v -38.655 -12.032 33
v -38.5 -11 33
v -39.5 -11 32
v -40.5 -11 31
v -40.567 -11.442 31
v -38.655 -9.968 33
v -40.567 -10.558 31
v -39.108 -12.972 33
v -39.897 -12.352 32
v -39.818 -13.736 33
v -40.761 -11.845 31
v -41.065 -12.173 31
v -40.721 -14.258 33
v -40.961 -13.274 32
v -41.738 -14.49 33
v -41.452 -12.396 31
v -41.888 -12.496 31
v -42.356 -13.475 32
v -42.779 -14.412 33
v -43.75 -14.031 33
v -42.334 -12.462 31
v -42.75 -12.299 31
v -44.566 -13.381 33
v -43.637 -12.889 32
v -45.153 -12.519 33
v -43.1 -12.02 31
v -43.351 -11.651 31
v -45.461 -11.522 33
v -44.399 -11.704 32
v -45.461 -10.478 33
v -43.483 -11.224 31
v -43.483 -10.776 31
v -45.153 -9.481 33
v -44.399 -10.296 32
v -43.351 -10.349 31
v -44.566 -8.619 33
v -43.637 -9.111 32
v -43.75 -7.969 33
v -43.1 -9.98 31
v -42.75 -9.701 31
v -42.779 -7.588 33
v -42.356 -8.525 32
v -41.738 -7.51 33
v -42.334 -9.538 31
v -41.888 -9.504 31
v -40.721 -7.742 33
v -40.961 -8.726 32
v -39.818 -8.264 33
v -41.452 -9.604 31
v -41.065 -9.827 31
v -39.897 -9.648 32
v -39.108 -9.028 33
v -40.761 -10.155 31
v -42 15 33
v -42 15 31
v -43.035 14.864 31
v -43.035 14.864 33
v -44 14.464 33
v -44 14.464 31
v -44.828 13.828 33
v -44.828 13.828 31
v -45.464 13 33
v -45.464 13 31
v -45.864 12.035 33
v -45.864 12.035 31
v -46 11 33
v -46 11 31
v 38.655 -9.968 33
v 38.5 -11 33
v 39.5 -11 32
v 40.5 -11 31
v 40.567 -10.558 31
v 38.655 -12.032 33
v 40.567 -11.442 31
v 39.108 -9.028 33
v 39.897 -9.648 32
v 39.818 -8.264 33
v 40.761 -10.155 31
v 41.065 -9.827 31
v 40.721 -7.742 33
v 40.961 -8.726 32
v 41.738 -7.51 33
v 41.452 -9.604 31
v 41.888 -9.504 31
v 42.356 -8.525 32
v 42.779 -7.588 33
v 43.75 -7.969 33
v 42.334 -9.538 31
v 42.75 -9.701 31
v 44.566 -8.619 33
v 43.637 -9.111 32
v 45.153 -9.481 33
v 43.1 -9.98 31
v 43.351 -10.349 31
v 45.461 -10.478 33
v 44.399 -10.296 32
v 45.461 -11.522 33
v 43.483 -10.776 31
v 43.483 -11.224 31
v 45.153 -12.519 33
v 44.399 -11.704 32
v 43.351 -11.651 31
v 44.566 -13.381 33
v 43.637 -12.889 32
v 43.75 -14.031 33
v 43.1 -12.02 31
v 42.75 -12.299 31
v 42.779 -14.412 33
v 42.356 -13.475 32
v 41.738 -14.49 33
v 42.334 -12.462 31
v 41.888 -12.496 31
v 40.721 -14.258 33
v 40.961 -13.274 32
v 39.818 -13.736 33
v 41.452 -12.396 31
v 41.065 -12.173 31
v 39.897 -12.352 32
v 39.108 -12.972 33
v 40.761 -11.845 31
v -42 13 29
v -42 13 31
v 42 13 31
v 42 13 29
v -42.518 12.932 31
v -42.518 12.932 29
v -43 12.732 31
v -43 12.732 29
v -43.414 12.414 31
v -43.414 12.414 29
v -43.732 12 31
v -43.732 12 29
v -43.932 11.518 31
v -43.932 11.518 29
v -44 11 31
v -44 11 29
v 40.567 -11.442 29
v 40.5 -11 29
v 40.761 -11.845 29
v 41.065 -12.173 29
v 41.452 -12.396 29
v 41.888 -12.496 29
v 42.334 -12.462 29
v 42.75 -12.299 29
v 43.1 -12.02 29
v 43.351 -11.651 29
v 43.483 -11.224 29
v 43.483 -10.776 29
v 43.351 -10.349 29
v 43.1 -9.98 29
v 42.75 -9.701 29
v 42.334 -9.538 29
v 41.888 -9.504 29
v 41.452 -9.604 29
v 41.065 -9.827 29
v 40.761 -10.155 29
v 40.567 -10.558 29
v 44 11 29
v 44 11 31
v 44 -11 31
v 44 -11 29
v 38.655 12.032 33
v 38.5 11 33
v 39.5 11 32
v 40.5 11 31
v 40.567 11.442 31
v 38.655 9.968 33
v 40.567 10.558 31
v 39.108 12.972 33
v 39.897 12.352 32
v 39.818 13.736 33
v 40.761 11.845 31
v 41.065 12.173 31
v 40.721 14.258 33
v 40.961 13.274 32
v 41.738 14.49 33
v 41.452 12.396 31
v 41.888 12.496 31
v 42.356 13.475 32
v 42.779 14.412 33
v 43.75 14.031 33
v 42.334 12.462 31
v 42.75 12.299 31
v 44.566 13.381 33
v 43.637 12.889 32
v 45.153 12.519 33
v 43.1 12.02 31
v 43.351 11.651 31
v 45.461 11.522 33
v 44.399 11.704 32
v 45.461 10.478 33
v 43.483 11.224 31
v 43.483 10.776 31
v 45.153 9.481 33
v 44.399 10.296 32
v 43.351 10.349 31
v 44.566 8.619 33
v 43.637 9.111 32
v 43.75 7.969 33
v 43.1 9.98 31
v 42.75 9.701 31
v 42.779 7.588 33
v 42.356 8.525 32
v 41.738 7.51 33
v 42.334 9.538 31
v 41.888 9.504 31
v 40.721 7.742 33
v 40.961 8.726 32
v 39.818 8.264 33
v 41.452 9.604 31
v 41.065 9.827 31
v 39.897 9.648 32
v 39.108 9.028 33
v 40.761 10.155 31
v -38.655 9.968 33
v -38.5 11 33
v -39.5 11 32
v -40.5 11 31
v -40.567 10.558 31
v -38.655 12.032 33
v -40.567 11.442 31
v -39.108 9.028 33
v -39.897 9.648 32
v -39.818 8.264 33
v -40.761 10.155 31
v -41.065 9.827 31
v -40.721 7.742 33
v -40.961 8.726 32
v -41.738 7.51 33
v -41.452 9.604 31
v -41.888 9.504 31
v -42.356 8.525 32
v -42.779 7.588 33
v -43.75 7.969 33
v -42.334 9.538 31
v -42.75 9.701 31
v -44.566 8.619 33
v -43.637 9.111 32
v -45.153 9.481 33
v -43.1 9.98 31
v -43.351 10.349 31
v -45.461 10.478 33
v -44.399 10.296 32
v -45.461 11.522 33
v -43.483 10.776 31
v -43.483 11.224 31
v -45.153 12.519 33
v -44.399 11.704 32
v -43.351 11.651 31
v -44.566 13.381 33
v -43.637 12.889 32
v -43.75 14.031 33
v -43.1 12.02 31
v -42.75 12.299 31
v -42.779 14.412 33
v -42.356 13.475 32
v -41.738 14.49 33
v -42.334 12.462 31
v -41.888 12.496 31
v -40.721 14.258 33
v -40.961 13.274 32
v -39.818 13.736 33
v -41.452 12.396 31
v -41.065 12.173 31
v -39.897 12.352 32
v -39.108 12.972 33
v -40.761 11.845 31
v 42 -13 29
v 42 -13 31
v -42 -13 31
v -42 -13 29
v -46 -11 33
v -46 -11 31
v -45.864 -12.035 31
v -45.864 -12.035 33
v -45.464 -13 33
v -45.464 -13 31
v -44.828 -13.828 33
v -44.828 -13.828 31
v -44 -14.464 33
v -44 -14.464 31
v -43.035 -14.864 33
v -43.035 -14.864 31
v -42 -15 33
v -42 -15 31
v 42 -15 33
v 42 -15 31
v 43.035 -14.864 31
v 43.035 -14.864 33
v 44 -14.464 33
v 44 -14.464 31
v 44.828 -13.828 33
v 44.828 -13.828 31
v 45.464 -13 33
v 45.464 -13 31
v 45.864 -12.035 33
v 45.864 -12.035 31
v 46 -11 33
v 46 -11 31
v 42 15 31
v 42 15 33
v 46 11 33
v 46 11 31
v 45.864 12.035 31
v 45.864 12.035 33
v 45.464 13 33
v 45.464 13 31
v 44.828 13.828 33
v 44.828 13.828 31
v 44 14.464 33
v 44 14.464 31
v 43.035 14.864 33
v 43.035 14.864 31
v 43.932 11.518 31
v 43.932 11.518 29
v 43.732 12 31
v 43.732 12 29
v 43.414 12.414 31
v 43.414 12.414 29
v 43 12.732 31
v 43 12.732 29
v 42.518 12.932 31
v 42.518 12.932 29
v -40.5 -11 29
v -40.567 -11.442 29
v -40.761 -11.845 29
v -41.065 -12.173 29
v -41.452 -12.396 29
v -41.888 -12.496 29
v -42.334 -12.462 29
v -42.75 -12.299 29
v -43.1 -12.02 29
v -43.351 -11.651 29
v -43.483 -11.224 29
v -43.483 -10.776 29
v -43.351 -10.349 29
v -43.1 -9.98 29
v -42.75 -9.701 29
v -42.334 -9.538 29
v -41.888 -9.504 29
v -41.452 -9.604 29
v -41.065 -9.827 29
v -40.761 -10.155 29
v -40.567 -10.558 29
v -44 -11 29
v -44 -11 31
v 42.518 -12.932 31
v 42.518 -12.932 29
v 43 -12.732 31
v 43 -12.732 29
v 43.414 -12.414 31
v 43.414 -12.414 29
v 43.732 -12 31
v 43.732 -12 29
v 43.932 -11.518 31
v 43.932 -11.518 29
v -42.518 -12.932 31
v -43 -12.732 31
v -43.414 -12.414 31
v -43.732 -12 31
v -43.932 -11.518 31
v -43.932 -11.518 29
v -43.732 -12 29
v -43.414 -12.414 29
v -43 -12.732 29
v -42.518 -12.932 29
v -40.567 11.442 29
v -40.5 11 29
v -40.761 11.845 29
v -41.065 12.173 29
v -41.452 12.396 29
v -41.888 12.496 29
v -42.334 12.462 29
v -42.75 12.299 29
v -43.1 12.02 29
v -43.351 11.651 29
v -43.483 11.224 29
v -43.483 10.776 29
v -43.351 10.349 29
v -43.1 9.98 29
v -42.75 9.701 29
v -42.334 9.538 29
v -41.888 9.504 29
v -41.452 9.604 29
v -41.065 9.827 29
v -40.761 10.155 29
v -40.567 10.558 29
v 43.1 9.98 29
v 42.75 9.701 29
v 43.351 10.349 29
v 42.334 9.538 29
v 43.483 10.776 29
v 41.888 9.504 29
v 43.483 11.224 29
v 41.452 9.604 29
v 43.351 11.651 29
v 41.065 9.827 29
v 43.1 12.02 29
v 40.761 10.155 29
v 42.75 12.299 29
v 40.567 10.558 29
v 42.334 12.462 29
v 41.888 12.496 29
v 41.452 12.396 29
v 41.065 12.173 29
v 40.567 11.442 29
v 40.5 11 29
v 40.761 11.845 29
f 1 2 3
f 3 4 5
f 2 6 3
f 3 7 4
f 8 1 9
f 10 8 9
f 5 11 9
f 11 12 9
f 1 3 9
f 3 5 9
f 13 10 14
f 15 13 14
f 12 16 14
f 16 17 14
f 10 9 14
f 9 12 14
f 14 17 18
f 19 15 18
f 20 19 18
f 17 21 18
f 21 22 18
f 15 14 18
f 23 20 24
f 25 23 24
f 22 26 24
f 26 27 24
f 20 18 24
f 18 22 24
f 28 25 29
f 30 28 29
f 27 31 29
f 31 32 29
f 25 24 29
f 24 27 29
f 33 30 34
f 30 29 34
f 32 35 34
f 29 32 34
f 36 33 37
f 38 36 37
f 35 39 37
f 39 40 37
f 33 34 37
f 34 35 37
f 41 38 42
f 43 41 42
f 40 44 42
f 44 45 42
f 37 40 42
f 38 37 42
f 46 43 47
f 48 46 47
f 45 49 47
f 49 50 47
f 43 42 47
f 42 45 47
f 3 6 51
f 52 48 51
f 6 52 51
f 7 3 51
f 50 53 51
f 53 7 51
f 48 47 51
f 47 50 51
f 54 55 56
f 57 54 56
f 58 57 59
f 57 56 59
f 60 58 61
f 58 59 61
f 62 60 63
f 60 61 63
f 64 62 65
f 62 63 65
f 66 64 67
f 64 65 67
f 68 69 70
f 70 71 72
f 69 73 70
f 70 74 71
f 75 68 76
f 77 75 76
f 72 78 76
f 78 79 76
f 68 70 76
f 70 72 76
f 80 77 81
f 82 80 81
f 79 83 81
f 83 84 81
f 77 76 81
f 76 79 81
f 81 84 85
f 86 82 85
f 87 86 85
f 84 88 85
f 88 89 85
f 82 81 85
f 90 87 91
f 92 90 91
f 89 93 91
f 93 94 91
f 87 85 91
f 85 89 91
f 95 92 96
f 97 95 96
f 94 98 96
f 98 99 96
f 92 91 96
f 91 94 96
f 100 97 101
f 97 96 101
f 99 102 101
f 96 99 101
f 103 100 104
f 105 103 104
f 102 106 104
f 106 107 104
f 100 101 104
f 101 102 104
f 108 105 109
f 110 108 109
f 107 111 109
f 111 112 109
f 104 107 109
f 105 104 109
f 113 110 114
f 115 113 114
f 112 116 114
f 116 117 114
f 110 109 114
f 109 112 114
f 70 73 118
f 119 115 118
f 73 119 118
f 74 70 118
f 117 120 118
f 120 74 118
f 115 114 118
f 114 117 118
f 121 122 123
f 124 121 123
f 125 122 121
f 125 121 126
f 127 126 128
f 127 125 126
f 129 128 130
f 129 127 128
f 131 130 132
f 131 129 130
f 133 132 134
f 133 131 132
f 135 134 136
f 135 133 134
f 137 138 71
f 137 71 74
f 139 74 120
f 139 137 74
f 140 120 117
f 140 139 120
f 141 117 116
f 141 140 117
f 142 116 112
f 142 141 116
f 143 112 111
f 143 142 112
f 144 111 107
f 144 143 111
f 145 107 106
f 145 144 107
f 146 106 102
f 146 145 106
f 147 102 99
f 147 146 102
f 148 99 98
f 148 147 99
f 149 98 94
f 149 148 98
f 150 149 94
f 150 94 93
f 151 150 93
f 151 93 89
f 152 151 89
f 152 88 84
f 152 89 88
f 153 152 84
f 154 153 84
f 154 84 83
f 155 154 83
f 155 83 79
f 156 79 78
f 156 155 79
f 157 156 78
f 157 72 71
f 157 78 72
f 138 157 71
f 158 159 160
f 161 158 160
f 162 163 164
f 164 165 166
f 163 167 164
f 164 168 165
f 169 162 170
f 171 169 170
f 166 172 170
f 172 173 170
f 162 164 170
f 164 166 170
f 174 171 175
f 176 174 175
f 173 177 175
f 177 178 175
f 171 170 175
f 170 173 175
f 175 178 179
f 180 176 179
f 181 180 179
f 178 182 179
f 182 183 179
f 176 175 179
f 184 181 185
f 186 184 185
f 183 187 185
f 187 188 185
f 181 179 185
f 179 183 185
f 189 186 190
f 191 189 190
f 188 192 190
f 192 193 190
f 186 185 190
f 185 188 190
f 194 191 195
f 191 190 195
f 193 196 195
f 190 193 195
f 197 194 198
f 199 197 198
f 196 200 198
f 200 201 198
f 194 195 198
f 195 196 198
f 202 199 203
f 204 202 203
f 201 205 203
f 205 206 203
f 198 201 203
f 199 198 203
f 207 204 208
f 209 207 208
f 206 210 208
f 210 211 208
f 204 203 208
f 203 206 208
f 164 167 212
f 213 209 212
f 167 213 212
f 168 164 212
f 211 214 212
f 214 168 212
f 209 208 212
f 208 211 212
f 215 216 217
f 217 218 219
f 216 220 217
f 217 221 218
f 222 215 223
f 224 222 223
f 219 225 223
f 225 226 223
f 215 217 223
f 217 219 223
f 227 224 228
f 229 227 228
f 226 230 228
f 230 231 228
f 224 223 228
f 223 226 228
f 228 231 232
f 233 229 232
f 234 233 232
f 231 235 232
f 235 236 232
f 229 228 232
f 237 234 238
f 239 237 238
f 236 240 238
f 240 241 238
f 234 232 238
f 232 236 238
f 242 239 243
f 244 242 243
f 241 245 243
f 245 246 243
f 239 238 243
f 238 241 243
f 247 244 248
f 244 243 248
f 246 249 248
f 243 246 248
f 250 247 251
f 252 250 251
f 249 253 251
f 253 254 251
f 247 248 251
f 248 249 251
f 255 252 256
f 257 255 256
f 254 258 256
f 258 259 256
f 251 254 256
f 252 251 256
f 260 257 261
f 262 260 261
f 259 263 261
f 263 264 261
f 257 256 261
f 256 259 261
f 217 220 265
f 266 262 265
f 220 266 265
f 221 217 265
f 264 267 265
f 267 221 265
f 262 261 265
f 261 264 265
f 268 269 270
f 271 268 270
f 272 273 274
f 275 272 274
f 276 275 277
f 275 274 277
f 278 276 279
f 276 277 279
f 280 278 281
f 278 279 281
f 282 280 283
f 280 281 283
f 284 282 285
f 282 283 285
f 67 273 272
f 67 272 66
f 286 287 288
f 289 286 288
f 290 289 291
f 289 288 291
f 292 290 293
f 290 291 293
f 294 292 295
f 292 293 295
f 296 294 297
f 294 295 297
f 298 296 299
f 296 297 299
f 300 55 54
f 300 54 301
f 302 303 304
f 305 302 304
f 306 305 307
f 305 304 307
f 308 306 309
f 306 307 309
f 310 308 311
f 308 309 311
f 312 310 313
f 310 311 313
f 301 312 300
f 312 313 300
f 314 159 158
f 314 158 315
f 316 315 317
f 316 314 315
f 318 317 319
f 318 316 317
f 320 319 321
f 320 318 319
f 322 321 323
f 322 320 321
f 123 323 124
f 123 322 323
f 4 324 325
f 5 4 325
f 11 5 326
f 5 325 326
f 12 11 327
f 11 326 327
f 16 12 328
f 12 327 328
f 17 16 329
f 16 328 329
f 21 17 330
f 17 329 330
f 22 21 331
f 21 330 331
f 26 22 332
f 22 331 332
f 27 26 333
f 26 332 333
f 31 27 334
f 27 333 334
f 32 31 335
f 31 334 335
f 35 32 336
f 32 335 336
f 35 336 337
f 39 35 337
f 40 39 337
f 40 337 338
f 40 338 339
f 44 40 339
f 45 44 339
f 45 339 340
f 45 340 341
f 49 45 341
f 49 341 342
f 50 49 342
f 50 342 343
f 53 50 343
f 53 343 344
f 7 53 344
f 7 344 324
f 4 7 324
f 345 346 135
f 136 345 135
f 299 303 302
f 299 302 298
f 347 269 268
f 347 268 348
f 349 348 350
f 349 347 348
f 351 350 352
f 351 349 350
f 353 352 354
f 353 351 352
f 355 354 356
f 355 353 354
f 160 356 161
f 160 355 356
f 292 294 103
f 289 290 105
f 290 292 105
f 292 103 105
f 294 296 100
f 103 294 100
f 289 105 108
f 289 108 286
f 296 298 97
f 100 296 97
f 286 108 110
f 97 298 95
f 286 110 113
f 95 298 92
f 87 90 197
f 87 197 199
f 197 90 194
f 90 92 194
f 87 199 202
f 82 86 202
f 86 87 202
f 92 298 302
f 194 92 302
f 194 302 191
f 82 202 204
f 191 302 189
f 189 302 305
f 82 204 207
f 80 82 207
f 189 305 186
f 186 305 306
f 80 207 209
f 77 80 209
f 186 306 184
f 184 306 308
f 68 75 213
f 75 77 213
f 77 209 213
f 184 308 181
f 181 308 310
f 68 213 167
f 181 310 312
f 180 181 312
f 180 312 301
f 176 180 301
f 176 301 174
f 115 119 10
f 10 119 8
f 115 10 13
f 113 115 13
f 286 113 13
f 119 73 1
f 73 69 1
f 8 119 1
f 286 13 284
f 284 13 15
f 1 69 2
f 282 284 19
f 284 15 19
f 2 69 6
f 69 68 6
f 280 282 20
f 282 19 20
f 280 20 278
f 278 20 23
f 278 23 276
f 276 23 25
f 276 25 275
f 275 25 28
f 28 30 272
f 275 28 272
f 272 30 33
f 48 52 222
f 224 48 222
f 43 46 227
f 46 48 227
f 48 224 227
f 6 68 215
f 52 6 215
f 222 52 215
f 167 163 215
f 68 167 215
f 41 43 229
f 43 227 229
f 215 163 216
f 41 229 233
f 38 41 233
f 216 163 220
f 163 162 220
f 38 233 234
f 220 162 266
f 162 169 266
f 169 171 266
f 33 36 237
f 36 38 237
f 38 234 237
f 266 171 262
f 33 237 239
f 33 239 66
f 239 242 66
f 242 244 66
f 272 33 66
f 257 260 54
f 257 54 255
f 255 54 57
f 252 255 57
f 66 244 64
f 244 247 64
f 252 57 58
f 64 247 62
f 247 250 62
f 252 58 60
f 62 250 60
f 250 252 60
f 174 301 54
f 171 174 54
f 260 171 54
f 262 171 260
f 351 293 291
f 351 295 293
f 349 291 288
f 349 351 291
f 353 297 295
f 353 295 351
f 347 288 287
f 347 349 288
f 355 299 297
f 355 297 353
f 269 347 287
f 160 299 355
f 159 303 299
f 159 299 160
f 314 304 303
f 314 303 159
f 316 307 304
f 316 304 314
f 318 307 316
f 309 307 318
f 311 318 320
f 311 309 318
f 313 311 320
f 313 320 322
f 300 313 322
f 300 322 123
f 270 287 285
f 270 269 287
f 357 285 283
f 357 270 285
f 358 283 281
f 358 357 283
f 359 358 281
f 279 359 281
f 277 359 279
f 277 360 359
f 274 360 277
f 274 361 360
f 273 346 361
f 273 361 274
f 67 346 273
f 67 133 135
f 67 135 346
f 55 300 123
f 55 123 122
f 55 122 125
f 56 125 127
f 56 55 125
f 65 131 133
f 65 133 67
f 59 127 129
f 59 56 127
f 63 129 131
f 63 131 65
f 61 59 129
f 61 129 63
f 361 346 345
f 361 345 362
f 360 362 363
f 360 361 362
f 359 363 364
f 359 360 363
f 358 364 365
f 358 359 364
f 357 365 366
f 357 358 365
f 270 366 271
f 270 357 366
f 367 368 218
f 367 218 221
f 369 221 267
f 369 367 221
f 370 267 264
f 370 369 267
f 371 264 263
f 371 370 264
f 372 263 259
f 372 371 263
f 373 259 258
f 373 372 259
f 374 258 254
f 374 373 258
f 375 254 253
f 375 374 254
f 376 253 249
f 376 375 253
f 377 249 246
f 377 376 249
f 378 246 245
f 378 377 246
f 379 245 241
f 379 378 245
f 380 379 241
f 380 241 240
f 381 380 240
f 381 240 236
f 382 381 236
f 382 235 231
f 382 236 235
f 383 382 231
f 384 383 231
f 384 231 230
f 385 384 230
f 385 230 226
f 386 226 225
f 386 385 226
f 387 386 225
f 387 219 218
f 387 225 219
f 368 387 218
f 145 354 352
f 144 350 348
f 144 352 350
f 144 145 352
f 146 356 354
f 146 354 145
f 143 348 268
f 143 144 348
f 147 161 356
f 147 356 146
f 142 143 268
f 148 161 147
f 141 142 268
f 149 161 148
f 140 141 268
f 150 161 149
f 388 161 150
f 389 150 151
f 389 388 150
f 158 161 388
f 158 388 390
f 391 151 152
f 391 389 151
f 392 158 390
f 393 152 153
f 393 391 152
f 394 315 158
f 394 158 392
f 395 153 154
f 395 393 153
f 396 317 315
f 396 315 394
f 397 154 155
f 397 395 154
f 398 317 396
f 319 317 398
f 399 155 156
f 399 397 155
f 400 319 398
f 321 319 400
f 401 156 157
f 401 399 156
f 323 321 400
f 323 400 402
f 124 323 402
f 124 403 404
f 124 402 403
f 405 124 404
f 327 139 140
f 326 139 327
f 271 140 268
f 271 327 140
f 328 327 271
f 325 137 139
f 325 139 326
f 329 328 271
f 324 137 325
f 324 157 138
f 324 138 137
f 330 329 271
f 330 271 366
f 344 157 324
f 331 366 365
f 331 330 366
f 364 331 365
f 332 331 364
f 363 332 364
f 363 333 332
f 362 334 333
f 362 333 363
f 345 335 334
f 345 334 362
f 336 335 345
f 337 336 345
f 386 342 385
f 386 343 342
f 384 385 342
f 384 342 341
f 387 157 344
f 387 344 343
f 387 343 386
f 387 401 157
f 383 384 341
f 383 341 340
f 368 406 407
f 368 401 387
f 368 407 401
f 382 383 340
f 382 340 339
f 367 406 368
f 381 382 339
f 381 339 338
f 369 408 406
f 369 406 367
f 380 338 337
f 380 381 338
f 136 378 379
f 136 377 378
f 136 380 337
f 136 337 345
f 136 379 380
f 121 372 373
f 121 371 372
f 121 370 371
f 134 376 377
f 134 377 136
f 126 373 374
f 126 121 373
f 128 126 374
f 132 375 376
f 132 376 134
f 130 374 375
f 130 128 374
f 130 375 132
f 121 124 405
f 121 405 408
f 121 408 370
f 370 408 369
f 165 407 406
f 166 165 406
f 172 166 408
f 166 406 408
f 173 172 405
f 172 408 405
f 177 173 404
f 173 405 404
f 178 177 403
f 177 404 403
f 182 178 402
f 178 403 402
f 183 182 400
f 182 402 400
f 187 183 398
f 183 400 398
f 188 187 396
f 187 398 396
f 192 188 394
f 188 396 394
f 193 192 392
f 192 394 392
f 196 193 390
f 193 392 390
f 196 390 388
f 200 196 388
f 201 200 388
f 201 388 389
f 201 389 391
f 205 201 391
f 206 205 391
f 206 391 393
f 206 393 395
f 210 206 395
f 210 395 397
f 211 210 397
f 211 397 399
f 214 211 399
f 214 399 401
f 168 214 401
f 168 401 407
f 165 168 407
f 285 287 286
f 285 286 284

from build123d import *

# Parameters (mm, degrees)
PAD002_DEPTH                  = 2
PAD003_DEPTH                  = 2
SKETCH005_R                   = 1.5
POCKET001_DEPTH               = 226.7018
SKETCH005_MIRRORED002_2_R     = 1.5
POCKET001_MIRRORED002_2_DEPTH = 226.7018
CHAMFER_SIZE                  = 2


with BuildPart() as part:
    # Sketch003 → Pad002 (new body)
    with BuildSketch(Plane.XY.offset(31)):
        with BuildLine():
            Line((-42, 15), (42, 15))
            ThreePointArc((46, 11), (44.828427, 13.828427), (42, 15))
            Line((46, 11), (46, -11))
            ThreePointArc((42, -15), (44.828427, -13.828427), (46, -11))
            Line((42, -15), (-42, -15))
            ThreePointArc((-46, -11), (-44.828427, -13.828427), (-42, -15))
            Line((-46, -11), (-46, 11))
            ThreePointArc((-42, 15), (-44.828427, 13.828427), (-46, 11))
        make_face()
    extrude(amount=PAD002_DEPTH)

    # Sketch004 → Pad003 (join)
    with BuildSketch(Plane.XY.offset(31)):
        with BuildLine():
            Line((-42, 13), (42, 13))
            ThreePointArc((44, 11), (43.414214, 12.414214), (42, 13))
            Line((44, 11), (44, -11))
            ThreePointArc((42, -13), (43.414214, -12.414214), (44, -11))
            Line((42, -13), (-42, -13))
            ThreePointArc((-44, -11), (-43.414214, -12.414214), (-42, -13))
            Line((-44, -11), (-44, 11))
            ThreePointArc((-42, 13), (-43.414214, 12.414214), (-44, 11))
        make_face()
    extrude(amount=-PAD003_DEPTH)

    # Sketch005 → Pocket001 (cut, through all)
    with BuildSketch(Plane.XY):
        with Locations((-42, 11)):
            Circle(SKETCH005_R)
    pocket001 = extrude(amount=POCKET001_DEPTH, mode=Mode.SUBTRACT)

    # Sketch005 Mirrored002 2 → Pocket001 Mirrored002 2 (cut, through all)
    with BuildSketch(Plane(origin=(0, 0, 0), x_dir=(-1, 0, 0), z_dir=(0, 0, -1))):
        with Locations((-42, 11)):
            Circle(SKETCH005_MIRRORED002_2_R)
    pocket001_mirrored002_2 = extrude(amount=-POCKET001_MIRRORED002_2_DEPTH, mode=Mode.SUBTRACT)

    # Mirrored003: Pocket001, Pocket001 Mirrored002 2 across Sketch005 H_Axis
    add(pocket001.mirror(Plane.ZX), mode=Mode.SUBTRACT)
    add(pocket001_mirrored002_2.mirror(Plane.ZX), mode=Mode.SUBTRACT)

    # Chamfer
    chamfer_edges = [part.edges().sort_by_distance(p)[0] for p in [
        (-43.5, -11, 33),
        (-43.5, 11, 33),
        (43.5, 11, 33),
        (43.5, -11, 33),
    ]]
    chamfer(chamfer_edges, length=CHAMFER_SIZE)


solid = part.part
